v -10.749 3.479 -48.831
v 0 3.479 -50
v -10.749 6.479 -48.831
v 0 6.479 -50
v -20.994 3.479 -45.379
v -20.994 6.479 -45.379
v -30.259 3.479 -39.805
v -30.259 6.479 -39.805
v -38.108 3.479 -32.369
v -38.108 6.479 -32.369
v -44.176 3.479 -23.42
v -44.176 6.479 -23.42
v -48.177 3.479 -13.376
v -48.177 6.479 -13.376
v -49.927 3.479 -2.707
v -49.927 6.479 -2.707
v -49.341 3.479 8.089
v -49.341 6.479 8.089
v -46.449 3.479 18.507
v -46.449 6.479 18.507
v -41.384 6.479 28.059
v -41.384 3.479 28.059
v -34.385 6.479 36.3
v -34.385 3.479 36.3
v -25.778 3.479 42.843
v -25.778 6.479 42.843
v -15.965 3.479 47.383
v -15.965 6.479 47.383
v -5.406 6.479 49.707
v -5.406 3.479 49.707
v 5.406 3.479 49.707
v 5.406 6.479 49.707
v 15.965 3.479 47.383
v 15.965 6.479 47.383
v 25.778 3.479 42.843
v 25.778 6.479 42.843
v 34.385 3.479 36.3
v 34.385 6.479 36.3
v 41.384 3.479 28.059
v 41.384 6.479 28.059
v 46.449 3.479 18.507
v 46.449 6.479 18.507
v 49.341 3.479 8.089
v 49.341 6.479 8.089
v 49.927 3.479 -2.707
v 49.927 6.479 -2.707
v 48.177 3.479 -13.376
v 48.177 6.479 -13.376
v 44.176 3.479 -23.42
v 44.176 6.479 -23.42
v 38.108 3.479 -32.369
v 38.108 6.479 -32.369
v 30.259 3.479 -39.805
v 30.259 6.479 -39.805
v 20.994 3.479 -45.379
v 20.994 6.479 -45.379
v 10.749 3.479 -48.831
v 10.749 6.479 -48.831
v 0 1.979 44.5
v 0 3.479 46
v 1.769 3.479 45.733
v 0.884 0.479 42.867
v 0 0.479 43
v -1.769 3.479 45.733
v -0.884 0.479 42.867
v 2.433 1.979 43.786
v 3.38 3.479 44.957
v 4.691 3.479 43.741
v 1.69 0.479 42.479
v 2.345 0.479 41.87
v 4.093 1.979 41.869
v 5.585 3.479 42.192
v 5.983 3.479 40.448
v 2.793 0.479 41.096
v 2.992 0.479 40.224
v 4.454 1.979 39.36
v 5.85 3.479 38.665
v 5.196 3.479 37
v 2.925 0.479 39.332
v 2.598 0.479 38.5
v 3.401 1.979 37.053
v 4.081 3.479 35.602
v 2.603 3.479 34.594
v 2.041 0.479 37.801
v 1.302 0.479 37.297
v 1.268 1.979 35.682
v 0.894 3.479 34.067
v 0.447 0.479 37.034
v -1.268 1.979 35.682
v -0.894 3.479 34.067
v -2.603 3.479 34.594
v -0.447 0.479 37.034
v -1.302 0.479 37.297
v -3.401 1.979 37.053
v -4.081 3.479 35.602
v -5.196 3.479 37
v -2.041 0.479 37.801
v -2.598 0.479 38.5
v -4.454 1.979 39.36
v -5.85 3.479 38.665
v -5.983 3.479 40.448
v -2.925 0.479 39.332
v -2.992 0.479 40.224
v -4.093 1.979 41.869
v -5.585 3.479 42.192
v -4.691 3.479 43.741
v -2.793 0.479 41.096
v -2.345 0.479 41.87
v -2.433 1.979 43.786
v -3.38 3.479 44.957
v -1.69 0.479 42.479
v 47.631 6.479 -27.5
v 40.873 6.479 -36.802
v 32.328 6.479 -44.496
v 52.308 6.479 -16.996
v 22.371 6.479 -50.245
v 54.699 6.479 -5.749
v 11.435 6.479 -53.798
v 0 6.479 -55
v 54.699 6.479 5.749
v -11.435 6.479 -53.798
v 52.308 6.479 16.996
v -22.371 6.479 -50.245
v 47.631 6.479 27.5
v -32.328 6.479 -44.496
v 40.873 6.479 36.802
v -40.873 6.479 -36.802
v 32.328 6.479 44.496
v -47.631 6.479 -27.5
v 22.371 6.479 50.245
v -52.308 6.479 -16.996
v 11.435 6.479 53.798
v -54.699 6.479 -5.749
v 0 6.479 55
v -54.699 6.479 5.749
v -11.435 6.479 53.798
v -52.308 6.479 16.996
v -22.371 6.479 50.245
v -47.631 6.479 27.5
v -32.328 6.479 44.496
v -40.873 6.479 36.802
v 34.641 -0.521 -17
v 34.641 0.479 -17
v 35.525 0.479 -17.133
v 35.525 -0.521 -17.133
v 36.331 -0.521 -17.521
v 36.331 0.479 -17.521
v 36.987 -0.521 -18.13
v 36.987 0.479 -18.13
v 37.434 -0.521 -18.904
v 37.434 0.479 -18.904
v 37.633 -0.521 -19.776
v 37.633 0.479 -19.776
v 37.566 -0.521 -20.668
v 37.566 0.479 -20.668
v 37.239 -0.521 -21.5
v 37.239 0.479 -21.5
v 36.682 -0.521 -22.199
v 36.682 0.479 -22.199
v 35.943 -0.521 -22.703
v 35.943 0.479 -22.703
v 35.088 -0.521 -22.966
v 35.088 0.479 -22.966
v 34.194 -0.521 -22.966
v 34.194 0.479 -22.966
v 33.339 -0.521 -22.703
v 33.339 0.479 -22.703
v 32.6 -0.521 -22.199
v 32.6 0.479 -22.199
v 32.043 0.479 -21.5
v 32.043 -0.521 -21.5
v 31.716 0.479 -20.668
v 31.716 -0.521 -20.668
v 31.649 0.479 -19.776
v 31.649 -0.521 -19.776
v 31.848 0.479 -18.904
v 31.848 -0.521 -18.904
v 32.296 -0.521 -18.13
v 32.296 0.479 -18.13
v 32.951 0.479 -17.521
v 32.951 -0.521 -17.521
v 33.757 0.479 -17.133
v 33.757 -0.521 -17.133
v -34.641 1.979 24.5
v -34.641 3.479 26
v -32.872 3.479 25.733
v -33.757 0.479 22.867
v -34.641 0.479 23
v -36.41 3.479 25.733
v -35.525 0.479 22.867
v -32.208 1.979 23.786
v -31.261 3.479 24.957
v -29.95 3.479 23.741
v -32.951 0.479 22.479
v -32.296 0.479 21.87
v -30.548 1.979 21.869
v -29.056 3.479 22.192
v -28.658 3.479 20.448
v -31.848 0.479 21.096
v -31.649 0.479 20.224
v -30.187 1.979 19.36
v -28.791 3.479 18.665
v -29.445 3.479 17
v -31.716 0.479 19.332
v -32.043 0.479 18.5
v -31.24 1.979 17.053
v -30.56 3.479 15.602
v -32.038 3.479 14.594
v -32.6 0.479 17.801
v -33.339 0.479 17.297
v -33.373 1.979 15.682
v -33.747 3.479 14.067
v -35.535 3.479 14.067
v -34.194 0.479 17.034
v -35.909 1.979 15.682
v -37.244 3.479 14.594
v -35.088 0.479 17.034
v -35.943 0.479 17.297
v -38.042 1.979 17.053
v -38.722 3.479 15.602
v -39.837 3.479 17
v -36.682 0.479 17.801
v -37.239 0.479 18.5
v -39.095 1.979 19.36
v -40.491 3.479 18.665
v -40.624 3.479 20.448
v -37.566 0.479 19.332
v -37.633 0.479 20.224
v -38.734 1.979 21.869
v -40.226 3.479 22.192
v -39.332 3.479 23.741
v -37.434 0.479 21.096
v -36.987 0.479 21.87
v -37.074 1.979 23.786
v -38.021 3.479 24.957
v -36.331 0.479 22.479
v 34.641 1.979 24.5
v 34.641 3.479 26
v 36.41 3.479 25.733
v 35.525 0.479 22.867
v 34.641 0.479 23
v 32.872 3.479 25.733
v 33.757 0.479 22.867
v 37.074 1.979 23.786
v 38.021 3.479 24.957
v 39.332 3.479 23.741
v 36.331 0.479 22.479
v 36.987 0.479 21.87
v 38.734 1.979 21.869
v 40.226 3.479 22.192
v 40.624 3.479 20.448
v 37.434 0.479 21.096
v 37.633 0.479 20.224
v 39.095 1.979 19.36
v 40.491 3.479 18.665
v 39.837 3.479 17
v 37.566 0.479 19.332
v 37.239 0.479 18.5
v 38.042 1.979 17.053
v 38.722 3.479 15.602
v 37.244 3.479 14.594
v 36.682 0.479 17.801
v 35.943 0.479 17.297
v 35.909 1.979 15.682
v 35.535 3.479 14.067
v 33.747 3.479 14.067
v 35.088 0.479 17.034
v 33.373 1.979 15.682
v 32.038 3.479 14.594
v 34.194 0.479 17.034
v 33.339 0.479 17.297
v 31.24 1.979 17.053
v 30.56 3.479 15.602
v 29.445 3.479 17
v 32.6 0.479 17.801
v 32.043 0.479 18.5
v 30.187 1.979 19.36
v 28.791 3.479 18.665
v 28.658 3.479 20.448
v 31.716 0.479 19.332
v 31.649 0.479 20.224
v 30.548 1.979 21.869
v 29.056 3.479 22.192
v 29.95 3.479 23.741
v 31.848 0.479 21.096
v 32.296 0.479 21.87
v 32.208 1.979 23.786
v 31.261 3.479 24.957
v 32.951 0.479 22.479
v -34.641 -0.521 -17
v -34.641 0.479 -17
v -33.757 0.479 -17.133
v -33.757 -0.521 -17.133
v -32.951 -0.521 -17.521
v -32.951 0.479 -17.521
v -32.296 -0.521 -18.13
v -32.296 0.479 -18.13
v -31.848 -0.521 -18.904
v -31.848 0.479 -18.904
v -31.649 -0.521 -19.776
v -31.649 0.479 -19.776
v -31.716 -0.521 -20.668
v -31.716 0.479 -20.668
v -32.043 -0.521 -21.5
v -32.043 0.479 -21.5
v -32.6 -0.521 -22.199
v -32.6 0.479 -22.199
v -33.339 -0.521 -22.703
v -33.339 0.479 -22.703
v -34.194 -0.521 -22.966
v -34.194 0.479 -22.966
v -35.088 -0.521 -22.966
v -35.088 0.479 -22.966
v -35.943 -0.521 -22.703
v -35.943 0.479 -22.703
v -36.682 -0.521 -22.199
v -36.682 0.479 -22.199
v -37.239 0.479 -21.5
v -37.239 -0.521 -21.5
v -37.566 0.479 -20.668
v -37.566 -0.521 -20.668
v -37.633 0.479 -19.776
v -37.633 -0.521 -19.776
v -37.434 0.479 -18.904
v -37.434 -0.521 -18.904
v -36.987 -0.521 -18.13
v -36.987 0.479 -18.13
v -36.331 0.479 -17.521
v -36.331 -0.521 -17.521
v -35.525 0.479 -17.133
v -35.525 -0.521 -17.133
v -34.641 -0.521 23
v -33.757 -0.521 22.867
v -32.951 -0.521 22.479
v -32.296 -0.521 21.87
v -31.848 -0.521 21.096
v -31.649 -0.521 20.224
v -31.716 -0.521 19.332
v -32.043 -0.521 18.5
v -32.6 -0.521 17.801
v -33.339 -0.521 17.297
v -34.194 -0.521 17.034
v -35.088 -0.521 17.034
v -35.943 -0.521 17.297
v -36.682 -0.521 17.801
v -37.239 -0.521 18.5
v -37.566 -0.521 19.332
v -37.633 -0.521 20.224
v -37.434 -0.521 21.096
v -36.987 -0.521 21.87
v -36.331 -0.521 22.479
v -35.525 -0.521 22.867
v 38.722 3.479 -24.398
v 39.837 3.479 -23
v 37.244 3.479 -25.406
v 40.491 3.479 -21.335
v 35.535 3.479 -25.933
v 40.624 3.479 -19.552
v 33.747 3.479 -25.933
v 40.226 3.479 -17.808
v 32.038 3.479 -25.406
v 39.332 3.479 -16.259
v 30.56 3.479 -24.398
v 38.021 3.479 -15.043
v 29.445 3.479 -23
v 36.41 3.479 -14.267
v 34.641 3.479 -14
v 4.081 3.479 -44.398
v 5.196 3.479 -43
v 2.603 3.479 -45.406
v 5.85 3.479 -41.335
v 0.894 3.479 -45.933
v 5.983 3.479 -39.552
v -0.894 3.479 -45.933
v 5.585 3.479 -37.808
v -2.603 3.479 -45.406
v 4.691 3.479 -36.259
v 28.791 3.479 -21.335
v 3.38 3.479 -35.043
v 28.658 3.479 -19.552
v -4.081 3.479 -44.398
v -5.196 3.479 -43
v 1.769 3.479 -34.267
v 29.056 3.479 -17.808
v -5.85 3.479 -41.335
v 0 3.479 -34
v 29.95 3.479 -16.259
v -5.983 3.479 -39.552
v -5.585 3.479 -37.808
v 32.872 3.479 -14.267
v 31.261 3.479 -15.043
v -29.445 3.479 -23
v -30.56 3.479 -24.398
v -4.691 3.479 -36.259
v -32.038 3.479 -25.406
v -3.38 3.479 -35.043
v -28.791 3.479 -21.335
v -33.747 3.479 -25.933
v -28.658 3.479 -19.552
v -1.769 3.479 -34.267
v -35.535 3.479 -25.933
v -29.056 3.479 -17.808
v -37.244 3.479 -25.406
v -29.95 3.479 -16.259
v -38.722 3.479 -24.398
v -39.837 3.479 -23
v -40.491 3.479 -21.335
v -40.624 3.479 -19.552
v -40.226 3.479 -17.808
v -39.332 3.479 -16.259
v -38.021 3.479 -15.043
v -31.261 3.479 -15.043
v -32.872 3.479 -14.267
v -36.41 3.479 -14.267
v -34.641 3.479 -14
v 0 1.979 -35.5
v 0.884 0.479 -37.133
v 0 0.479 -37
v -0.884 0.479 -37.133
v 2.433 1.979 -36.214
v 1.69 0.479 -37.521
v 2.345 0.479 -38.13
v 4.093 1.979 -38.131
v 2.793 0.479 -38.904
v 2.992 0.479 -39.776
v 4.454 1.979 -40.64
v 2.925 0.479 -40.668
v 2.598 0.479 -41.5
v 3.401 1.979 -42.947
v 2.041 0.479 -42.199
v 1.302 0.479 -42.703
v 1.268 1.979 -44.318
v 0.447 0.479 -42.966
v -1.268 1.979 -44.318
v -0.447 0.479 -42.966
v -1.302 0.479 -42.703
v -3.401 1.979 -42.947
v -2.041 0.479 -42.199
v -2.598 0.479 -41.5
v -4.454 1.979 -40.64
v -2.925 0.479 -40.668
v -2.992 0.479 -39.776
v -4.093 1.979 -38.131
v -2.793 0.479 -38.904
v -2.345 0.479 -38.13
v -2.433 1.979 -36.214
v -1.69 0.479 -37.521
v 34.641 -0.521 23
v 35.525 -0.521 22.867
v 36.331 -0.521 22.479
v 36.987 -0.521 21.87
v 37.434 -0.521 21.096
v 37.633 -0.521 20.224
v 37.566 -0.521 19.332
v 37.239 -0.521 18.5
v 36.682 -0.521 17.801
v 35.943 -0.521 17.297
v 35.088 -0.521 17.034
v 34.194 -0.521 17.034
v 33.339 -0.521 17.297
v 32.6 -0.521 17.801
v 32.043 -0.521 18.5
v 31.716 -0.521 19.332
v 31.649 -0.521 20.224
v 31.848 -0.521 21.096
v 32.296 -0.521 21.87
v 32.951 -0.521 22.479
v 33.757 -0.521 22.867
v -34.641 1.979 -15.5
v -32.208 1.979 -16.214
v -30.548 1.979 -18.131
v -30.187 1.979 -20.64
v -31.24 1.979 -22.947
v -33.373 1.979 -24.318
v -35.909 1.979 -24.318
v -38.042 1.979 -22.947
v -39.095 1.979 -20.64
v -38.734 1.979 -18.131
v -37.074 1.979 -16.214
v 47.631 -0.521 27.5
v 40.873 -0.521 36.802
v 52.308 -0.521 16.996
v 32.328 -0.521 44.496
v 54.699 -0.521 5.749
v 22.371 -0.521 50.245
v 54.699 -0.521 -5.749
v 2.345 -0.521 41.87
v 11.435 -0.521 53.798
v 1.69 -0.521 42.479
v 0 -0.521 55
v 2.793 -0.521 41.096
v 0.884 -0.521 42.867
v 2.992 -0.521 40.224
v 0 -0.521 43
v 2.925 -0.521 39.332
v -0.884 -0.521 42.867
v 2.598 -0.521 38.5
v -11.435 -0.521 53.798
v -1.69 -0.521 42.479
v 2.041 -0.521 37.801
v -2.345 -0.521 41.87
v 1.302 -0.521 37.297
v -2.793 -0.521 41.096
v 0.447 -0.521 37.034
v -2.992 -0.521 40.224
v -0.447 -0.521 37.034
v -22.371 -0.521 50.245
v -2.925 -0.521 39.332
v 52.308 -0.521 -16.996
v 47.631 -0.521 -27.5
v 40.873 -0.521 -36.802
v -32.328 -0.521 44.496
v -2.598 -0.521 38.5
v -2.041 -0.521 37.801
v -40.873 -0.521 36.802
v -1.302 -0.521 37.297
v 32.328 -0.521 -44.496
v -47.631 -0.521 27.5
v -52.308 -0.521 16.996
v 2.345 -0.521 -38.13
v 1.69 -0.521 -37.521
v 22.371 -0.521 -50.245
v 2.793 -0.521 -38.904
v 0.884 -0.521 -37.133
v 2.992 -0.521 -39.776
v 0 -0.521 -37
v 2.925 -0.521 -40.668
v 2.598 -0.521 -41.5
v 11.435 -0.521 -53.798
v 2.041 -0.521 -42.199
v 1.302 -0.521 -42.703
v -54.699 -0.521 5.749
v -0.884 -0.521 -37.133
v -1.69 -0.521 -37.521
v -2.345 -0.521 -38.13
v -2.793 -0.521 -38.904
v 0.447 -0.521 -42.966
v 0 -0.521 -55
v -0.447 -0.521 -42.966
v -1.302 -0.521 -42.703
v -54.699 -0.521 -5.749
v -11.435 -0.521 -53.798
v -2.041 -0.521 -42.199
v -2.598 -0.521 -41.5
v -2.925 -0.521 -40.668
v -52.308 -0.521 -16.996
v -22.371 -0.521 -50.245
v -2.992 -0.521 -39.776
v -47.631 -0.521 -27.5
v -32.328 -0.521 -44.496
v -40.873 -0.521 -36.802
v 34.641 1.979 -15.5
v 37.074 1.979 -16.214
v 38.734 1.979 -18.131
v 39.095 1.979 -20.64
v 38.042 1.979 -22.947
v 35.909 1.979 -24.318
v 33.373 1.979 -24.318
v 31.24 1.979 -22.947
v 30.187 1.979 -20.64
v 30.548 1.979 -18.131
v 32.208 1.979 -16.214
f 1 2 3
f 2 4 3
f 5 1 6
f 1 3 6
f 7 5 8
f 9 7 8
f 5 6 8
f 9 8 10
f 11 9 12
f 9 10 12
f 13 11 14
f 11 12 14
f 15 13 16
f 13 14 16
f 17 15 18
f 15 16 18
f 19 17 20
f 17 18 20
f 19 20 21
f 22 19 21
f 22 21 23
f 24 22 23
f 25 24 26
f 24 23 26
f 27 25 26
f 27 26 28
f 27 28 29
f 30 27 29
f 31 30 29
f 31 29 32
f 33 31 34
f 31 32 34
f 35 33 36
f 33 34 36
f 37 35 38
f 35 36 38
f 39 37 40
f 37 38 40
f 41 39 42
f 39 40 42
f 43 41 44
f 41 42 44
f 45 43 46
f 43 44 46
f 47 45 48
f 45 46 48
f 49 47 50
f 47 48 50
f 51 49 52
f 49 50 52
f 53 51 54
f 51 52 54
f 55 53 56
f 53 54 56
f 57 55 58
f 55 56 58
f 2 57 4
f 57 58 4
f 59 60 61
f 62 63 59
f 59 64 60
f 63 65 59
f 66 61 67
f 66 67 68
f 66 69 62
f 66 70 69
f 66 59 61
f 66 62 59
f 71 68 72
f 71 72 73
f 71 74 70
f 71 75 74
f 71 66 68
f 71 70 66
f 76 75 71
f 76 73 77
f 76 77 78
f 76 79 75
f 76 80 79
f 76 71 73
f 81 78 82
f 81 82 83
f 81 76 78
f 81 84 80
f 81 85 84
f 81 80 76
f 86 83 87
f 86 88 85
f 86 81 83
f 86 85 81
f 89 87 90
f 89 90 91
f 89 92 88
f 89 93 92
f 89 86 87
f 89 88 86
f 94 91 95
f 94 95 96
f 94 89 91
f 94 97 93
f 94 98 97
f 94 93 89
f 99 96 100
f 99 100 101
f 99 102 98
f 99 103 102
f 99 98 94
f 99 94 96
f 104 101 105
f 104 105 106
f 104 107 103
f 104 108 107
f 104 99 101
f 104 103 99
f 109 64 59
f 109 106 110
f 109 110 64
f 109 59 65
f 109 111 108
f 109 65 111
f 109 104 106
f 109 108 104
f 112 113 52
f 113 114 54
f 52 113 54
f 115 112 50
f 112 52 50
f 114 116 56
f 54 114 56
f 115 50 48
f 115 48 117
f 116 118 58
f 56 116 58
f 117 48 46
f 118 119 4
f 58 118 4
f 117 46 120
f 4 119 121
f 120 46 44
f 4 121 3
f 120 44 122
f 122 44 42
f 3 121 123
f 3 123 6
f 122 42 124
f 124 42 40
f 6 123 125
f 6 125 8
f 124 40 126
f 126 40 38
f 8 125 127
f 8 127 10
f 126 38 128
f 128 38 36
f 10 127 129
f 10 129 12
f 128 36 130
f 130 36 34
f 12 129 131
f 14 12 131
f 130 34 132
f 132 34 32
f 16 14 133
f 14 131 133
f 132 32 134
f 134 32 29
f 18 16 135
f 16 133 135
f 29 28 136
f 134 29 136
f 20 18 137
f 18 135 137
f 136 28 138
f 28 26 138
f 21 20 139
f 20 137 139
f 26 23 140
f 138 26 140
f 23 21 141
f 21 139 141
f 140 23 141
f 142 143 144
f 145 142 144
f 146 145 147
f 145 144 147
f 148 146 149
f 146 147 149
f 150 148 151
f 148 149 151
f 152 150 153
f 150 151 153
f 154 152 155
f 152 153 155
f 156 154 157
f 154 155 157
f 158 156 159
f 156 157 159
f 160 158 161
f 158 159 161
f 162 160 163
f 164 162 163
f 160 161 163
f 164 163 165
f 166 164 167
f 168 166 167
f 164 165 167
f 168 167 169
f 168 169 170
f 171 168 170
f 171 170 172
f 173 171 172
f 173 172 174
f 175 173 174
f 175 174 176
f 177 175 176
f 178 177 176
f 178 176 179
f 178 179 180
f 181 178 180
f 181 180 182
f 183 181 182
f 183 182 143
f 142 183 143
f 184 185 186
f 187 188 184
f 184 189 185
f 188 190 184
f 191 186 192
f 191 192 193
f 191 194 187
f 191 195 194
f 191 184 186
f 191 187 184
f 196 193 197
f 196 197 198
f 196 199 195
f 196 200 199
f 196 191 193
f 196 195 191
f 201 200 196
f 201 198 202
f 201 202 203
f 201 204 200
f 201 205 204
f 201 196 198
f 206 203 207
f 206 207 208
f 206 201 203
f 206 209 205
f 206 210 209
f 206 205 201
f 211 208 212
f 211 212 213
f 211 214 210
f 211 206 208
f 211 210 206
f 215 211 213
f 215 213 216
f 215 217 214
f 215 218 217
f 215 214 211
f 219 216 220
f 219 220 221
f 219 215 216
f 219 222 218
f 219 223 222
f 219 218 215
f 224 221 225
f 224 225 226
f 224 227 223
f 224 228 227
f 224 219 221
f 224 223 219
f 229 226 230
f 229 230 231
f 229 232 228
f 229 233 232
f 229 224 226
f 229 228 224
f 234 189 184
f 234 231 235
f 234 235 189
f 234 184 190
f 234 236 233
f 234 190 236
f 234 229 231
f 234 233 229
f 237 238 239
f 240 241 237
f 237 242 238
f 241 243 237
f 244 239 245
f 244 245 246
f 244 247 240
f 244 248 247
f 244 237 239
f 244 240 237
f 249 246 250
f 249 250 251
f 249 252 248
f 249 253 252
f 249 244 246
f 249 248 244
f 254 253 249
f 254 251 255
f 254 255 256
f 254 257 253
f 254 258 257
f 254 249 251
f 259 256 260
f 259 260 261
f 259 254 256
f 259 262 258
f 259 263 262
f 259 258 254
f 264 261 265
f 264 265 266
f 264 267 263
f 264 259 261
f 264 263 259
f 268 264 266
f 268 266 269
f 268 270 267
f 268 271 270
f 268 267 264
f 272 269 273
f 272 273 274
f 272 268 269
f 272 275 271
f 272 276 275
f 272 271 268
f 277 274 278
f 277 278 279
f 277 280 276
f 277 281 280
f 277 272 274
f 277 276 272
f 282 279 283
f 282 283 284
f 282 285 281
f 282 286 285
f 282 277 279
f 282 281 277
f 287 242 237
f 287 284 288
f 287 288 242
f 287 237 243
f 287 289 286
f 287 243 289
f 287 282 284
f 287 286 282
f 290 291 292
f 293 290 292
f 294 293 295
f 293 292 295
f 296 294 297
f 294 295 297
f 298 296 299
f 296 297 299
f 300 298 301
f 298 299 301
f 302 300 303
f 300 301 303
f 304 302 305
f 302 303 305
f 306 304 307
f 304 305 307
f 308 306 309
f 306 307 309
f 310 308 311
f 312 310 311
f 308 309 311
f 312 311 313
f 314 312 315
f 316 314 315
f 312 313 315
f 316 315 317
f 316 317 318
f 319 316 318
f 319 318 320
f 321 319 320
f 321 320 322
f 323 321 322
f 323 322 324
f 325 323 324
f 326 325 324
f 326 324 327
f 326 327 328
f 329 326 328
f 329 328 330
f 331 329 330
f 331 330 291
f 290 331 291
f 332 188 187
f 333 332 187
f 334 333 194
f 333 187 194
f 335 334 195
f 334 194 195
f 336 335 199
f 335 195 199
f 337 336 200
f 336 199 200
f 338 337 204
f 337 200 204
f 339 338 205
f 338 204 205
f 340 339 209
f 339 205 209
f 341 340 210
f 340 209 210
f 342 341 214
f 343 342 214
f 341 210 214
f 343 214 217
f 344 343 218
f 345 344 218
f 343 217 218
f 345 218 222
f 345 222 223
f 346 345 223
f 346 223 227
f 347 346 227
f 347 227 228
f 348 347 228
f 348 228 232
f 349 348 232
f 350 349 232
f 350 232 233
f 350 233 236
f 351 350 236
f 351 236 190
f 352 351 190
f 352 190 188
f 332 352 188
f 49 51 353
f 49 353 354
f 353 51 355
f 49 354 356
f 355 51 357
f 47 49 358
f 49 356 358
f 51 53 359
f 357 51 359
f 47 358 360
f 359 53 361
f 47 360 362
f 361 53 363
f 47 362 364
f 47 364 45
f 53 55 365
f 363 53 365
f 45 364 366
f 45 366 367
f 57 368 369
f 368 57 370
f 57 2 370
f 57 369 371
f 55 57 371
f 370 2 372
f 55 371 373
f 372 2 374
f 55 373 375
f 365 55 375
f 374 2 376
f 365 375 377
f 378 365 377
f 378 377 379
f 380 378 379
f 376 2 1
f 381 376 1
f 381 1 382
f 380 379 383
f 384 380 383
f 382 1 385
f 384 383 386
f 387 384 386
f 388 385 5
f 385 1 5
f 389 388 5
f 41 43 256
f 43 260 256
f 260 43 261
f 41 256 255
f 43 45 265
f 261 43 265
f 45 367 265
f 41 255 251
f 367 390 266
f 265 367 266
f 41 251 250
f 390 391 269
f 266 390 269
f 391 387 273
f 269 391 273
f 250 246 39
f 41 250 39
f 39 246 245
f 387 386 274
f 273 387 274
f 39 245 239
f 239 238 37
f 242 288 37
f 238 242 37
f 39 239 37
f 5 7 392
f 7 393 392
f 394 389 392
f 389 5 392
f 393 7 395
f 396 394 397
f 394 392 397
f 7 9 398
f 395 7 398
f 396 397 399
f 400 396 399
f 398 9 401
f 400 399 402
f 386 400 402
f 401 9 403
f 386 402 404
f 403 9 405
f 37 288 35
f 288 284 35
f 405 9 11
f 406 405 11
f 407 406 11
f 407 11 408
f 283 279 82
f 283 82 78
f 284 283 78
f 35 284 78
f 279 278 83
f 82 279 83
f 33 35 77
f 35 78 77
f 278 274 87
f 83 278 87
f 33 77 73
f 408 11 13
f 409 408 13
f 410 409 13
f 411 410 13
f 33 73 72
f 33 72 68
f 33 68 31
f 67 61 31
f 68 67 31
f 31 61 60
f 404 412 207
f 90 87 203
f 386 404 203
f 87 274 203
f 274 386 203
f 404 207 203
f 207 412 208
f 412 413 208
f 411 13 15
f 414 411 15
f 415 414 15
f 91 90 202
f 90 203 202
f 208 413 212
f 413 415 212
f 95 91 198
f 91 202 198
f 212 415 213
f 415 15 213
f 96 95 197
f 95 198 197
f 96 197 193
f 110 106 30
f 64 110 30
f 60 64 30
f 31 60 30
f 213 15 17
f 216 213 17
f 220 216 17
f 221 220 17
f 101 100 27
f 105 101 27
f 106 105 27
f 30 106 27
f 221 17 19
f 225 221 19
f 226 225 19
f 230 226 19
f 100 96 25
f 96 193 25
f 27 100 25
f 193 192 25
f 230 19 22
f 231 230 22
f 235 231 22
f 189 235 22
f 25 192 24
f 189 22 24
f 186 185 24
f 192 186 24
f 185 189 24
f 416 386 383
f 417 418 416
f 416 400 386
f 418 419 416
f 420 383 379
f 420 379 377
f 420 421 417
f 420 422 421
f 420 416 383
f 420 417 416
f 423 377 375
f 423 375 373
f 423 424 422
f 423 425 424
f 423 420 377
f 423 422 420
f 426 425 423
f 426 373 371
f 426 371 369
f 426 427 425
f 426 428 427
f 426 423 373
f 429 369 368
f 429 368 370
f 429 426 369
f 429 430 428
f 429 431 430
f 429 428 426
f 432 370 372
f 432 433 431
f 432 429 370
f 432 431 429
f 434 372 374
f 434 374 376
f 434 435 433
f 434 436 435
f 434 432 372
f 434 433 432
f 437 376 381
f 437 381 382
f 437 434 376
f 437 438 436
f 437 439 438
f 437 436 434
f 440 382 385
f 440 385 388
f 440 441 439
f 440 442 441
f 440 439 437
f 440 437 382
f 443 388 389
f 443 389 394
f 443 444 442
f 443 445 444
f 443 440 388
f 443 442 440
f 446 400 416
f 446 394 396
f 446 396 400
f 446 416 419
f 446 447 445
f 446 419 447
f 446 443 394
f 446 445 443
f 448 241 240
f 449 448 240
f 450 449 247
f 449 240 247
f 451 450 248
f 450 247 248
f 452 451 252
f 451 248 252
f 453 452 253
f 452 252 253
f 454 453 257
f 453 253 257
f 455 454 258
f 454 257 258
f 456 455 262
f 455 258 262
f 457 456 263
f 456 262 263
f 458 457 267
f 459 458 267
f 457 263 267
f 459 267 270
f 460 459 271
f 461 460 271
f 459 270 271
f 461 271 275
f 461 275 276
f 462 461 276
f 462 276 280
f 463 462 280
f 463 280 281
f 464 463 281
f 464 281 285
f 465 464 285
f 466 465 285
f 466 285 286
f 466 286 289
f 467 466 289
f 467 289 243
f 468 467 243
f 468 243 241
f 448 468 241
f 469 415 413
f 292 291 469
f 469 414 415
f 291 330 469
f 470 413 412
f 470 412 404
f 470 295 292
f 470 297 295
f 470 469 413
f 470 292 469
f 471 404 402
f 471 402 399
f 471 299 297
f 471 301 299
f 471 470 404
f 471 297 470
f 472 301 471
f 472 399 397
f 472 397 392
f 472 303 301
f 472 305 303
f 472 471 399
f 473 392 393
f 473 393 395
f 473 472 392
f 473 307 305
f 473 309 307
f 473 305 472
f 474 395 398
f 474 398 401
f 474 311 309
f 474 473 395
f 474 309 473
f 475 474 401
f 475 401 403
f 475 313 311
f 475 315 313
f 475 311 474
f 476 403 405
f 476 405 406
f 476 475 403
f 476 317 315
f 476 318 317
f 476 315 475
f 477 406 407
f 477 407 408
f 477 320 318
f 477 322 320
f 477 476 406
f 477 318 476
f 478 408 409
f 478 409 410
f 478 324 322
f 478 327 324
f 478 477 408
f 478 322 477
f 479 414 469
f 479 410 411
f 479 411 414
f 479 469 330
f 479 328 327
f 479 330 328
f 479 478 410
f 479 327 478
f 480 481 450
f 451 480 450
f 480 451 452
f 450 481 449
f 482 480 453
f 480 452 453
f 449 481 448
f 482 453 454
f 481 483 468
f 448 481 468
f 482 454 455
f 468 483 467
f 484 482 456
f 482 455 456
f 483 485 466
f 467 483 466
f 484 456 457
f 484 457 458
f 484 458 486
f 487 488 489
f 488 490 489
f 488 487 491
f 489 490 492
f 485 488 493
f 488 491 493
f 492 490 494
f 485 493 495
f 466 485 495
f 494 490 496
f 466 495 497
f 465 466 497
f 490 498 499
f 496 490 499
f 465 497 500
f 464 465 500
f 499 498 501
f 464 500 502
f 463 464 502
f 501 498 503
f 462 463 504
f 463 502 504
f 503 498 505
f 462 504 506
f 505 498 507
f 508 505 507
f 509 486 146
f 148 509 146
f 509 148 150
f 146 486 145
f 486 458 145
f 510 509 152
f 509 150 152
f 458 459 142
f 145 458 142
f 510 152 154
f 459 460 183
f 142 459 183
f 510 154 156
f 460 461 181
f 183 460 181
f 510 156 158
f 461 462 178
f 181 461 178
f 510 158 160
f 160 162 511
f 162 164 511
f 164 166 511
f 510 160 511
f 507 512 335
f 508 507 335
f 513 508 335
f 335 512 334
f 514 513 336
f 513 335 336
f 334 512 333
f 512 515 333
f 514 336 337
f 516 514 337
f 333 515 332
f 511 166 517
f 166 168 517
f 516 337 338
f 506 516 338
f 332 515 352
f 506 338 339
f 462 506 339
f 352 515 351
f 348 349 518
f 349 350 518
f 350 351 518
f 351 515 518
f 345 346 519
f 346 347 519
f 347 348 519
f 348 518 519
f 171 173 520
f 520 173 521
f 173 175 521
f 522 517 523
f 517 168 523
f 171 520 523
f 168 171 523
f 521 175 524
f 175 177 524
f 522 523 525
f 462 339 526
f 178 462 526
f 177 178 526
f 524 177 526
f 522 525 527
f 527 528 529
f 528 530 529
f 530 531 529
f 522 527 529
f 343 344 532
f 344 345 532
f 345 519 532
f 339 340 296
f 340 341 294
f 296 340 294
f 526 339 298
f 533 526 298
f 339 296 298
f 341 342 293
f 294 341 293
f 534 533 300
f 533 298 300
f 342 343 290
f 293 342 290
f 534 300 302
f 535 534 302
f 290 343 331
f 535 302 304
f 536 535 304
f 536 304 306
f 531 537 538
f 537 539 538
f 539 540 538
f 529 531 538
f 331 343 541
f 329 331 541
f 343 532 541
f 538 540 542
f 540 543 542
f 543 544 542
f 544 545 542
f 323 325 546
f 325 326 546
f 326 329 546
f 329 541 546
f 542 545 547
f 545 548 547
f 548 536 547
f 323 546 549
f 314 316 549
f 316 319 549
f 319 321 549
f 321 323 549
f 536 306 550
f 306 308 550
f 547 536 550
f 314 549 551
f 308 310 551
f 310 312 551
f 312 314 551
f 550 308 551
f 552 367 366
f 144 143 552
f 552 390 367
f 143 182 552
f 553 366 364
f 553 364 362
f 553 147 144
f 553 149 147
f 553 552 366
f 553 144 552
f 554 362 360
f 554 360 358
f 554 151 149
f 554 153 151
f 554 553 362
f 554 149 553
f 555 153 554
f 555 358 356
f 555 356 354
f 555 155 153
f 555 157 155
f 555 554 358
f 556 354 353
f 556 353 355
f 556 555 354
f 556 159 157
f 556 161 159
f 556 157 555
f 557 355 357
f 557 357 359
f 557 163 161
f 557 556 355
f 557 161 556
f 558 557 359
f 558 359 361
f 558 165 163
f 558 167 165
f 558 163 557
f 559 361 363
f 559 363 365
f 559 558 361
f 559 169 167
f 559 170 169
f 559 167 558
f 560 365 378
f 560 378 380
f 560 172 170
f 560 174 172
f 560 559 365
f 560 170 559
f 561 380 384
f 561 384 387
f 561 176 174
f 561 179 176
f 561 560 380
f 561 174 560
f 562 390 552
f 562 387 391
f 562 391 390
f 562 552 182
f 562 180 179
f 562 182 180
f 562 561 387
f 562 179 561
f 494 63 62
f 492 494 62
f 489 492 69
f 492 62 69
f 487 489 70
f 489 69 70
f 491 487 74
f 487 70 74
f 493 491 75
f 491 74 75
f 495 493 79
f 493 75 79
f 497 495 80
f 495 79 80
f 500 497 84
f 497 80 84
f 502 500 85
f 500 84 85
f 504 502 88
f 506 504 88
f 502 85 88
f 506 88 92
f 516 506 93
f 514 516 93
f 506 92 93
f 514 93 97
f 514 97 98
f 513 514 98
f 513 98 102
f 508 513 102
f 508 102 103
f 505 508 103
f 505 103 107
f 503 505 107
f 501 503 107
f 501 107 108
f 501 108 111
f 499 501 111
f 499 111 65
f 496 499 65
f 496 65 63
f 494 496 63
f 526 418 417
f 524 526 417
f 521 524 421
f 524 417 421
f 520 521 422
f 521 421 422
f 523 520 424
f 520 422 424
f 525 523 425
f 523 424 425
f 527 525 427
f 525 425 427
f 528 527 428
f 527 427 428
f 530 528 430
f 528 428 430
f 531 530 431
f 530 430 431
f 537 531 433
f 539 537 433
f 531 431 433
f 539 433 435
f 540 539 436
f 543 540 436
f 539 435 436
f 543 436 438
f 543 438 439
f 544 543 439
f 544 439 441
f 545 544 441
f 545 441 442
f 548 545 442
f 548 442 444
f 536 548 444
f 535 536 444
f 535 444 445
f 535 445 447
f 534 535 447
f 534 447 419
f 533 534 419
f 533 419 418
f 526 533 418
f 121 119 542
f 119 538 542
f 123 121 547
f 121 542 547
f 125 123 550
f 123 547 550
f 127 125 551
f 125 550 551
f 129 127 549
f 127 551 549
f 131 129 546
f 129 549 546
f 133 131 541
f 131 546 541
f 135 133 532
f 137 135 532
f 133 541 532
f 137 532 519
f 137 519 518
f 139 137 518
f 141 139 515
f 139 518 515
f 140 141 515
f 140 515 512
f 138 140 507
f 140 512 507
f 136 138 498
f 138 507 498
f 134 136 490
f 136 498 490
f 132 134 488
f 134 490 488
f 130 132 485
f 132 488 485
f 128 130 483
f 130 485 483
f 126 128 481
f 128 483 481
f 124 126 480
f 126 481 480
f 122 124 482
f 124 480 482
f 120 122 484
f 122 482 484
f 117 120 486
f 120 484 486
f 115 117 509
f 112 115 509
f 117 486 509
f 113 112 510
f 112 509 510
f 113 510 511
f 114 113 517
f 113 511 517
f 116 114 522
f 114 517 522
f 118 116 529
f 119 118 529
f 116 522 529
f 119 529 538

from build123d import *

# Parameters (mm, degrees)
SKETCH2_R          = 3
CUT_EXTRUDE1_DEPTH = 78.884529914
CHAMFER1_SIZE      = 3


with BuildPart() as part:
    # Sketch1 → Revolve1 (revolve)
    with BuildSketch(Plane.XY, mode=Mode.PRIVATE) as revolve1_sk:
        Polygon((50, 3.478641915), (50, 6.478641915), (55, 6.478641915), (55, -0.521358085), (0, -0.521358085), (0, 3.478641915), align=None)
    revolve(revolve1_sk.sketch.rotate(Axis((0, 0, 0), (0, 1, 0)), 90), axis=Axis((0, 0, 0), (0, 1, 0)))

    # Sketch2 → Cut-Extrude1 (cut, through all)
    with BuildSketch(Plane(origin=(0, 3.478641915, 0), x_dir=(1, 0, 0), z_dir=(0, 1, 0))):
        with Locations(Location((0, 40, 0), (0, 0, 270))):
            Circle(SKETCH2_R)
        with Locations(Location((34.641016151, 20, 0), (0, 0, 270))):
            Circle(SKETCH2_R)
        with Locations(Location((34.641016151, -20, 0), (0, 0, 270))):
            Circle(SKETCH2_R)
        with Locations(Location((0, -40, 0), (0, 0, 270))):
            Circle(SKETCH2_R)
        with Locations(Location((-34.641016151, -20, 0), (0, 0, 270))):
            Circle(SKETCH2_R)
        with Locations(Location((-34.641016151, 20, 0), (0, 0, 270))):
            Circle(SKETCH2_R)
    extrude(amount=-CUT_EXTRUDE1_DEPTH, mode=Mode.SUBTRACT)

    # Chamfer1
    chamfer1_edges = [part.edges().sort_by_distance(p)[0] for p in [
        (0, 3.478641915, -43),
        (-34.641016151, 3.478641915, -23),
        (-34.641016151, 3.478641915, 17),
        (0, 3.478641915, 37),
        (34.641016151, 3.478641915, 17),
        (34.641016151, 3.478641915, -23),
    ]]
    chamfer(chamfer1_edges, length=CHAMFER1_SIZE)


solid = part.part
